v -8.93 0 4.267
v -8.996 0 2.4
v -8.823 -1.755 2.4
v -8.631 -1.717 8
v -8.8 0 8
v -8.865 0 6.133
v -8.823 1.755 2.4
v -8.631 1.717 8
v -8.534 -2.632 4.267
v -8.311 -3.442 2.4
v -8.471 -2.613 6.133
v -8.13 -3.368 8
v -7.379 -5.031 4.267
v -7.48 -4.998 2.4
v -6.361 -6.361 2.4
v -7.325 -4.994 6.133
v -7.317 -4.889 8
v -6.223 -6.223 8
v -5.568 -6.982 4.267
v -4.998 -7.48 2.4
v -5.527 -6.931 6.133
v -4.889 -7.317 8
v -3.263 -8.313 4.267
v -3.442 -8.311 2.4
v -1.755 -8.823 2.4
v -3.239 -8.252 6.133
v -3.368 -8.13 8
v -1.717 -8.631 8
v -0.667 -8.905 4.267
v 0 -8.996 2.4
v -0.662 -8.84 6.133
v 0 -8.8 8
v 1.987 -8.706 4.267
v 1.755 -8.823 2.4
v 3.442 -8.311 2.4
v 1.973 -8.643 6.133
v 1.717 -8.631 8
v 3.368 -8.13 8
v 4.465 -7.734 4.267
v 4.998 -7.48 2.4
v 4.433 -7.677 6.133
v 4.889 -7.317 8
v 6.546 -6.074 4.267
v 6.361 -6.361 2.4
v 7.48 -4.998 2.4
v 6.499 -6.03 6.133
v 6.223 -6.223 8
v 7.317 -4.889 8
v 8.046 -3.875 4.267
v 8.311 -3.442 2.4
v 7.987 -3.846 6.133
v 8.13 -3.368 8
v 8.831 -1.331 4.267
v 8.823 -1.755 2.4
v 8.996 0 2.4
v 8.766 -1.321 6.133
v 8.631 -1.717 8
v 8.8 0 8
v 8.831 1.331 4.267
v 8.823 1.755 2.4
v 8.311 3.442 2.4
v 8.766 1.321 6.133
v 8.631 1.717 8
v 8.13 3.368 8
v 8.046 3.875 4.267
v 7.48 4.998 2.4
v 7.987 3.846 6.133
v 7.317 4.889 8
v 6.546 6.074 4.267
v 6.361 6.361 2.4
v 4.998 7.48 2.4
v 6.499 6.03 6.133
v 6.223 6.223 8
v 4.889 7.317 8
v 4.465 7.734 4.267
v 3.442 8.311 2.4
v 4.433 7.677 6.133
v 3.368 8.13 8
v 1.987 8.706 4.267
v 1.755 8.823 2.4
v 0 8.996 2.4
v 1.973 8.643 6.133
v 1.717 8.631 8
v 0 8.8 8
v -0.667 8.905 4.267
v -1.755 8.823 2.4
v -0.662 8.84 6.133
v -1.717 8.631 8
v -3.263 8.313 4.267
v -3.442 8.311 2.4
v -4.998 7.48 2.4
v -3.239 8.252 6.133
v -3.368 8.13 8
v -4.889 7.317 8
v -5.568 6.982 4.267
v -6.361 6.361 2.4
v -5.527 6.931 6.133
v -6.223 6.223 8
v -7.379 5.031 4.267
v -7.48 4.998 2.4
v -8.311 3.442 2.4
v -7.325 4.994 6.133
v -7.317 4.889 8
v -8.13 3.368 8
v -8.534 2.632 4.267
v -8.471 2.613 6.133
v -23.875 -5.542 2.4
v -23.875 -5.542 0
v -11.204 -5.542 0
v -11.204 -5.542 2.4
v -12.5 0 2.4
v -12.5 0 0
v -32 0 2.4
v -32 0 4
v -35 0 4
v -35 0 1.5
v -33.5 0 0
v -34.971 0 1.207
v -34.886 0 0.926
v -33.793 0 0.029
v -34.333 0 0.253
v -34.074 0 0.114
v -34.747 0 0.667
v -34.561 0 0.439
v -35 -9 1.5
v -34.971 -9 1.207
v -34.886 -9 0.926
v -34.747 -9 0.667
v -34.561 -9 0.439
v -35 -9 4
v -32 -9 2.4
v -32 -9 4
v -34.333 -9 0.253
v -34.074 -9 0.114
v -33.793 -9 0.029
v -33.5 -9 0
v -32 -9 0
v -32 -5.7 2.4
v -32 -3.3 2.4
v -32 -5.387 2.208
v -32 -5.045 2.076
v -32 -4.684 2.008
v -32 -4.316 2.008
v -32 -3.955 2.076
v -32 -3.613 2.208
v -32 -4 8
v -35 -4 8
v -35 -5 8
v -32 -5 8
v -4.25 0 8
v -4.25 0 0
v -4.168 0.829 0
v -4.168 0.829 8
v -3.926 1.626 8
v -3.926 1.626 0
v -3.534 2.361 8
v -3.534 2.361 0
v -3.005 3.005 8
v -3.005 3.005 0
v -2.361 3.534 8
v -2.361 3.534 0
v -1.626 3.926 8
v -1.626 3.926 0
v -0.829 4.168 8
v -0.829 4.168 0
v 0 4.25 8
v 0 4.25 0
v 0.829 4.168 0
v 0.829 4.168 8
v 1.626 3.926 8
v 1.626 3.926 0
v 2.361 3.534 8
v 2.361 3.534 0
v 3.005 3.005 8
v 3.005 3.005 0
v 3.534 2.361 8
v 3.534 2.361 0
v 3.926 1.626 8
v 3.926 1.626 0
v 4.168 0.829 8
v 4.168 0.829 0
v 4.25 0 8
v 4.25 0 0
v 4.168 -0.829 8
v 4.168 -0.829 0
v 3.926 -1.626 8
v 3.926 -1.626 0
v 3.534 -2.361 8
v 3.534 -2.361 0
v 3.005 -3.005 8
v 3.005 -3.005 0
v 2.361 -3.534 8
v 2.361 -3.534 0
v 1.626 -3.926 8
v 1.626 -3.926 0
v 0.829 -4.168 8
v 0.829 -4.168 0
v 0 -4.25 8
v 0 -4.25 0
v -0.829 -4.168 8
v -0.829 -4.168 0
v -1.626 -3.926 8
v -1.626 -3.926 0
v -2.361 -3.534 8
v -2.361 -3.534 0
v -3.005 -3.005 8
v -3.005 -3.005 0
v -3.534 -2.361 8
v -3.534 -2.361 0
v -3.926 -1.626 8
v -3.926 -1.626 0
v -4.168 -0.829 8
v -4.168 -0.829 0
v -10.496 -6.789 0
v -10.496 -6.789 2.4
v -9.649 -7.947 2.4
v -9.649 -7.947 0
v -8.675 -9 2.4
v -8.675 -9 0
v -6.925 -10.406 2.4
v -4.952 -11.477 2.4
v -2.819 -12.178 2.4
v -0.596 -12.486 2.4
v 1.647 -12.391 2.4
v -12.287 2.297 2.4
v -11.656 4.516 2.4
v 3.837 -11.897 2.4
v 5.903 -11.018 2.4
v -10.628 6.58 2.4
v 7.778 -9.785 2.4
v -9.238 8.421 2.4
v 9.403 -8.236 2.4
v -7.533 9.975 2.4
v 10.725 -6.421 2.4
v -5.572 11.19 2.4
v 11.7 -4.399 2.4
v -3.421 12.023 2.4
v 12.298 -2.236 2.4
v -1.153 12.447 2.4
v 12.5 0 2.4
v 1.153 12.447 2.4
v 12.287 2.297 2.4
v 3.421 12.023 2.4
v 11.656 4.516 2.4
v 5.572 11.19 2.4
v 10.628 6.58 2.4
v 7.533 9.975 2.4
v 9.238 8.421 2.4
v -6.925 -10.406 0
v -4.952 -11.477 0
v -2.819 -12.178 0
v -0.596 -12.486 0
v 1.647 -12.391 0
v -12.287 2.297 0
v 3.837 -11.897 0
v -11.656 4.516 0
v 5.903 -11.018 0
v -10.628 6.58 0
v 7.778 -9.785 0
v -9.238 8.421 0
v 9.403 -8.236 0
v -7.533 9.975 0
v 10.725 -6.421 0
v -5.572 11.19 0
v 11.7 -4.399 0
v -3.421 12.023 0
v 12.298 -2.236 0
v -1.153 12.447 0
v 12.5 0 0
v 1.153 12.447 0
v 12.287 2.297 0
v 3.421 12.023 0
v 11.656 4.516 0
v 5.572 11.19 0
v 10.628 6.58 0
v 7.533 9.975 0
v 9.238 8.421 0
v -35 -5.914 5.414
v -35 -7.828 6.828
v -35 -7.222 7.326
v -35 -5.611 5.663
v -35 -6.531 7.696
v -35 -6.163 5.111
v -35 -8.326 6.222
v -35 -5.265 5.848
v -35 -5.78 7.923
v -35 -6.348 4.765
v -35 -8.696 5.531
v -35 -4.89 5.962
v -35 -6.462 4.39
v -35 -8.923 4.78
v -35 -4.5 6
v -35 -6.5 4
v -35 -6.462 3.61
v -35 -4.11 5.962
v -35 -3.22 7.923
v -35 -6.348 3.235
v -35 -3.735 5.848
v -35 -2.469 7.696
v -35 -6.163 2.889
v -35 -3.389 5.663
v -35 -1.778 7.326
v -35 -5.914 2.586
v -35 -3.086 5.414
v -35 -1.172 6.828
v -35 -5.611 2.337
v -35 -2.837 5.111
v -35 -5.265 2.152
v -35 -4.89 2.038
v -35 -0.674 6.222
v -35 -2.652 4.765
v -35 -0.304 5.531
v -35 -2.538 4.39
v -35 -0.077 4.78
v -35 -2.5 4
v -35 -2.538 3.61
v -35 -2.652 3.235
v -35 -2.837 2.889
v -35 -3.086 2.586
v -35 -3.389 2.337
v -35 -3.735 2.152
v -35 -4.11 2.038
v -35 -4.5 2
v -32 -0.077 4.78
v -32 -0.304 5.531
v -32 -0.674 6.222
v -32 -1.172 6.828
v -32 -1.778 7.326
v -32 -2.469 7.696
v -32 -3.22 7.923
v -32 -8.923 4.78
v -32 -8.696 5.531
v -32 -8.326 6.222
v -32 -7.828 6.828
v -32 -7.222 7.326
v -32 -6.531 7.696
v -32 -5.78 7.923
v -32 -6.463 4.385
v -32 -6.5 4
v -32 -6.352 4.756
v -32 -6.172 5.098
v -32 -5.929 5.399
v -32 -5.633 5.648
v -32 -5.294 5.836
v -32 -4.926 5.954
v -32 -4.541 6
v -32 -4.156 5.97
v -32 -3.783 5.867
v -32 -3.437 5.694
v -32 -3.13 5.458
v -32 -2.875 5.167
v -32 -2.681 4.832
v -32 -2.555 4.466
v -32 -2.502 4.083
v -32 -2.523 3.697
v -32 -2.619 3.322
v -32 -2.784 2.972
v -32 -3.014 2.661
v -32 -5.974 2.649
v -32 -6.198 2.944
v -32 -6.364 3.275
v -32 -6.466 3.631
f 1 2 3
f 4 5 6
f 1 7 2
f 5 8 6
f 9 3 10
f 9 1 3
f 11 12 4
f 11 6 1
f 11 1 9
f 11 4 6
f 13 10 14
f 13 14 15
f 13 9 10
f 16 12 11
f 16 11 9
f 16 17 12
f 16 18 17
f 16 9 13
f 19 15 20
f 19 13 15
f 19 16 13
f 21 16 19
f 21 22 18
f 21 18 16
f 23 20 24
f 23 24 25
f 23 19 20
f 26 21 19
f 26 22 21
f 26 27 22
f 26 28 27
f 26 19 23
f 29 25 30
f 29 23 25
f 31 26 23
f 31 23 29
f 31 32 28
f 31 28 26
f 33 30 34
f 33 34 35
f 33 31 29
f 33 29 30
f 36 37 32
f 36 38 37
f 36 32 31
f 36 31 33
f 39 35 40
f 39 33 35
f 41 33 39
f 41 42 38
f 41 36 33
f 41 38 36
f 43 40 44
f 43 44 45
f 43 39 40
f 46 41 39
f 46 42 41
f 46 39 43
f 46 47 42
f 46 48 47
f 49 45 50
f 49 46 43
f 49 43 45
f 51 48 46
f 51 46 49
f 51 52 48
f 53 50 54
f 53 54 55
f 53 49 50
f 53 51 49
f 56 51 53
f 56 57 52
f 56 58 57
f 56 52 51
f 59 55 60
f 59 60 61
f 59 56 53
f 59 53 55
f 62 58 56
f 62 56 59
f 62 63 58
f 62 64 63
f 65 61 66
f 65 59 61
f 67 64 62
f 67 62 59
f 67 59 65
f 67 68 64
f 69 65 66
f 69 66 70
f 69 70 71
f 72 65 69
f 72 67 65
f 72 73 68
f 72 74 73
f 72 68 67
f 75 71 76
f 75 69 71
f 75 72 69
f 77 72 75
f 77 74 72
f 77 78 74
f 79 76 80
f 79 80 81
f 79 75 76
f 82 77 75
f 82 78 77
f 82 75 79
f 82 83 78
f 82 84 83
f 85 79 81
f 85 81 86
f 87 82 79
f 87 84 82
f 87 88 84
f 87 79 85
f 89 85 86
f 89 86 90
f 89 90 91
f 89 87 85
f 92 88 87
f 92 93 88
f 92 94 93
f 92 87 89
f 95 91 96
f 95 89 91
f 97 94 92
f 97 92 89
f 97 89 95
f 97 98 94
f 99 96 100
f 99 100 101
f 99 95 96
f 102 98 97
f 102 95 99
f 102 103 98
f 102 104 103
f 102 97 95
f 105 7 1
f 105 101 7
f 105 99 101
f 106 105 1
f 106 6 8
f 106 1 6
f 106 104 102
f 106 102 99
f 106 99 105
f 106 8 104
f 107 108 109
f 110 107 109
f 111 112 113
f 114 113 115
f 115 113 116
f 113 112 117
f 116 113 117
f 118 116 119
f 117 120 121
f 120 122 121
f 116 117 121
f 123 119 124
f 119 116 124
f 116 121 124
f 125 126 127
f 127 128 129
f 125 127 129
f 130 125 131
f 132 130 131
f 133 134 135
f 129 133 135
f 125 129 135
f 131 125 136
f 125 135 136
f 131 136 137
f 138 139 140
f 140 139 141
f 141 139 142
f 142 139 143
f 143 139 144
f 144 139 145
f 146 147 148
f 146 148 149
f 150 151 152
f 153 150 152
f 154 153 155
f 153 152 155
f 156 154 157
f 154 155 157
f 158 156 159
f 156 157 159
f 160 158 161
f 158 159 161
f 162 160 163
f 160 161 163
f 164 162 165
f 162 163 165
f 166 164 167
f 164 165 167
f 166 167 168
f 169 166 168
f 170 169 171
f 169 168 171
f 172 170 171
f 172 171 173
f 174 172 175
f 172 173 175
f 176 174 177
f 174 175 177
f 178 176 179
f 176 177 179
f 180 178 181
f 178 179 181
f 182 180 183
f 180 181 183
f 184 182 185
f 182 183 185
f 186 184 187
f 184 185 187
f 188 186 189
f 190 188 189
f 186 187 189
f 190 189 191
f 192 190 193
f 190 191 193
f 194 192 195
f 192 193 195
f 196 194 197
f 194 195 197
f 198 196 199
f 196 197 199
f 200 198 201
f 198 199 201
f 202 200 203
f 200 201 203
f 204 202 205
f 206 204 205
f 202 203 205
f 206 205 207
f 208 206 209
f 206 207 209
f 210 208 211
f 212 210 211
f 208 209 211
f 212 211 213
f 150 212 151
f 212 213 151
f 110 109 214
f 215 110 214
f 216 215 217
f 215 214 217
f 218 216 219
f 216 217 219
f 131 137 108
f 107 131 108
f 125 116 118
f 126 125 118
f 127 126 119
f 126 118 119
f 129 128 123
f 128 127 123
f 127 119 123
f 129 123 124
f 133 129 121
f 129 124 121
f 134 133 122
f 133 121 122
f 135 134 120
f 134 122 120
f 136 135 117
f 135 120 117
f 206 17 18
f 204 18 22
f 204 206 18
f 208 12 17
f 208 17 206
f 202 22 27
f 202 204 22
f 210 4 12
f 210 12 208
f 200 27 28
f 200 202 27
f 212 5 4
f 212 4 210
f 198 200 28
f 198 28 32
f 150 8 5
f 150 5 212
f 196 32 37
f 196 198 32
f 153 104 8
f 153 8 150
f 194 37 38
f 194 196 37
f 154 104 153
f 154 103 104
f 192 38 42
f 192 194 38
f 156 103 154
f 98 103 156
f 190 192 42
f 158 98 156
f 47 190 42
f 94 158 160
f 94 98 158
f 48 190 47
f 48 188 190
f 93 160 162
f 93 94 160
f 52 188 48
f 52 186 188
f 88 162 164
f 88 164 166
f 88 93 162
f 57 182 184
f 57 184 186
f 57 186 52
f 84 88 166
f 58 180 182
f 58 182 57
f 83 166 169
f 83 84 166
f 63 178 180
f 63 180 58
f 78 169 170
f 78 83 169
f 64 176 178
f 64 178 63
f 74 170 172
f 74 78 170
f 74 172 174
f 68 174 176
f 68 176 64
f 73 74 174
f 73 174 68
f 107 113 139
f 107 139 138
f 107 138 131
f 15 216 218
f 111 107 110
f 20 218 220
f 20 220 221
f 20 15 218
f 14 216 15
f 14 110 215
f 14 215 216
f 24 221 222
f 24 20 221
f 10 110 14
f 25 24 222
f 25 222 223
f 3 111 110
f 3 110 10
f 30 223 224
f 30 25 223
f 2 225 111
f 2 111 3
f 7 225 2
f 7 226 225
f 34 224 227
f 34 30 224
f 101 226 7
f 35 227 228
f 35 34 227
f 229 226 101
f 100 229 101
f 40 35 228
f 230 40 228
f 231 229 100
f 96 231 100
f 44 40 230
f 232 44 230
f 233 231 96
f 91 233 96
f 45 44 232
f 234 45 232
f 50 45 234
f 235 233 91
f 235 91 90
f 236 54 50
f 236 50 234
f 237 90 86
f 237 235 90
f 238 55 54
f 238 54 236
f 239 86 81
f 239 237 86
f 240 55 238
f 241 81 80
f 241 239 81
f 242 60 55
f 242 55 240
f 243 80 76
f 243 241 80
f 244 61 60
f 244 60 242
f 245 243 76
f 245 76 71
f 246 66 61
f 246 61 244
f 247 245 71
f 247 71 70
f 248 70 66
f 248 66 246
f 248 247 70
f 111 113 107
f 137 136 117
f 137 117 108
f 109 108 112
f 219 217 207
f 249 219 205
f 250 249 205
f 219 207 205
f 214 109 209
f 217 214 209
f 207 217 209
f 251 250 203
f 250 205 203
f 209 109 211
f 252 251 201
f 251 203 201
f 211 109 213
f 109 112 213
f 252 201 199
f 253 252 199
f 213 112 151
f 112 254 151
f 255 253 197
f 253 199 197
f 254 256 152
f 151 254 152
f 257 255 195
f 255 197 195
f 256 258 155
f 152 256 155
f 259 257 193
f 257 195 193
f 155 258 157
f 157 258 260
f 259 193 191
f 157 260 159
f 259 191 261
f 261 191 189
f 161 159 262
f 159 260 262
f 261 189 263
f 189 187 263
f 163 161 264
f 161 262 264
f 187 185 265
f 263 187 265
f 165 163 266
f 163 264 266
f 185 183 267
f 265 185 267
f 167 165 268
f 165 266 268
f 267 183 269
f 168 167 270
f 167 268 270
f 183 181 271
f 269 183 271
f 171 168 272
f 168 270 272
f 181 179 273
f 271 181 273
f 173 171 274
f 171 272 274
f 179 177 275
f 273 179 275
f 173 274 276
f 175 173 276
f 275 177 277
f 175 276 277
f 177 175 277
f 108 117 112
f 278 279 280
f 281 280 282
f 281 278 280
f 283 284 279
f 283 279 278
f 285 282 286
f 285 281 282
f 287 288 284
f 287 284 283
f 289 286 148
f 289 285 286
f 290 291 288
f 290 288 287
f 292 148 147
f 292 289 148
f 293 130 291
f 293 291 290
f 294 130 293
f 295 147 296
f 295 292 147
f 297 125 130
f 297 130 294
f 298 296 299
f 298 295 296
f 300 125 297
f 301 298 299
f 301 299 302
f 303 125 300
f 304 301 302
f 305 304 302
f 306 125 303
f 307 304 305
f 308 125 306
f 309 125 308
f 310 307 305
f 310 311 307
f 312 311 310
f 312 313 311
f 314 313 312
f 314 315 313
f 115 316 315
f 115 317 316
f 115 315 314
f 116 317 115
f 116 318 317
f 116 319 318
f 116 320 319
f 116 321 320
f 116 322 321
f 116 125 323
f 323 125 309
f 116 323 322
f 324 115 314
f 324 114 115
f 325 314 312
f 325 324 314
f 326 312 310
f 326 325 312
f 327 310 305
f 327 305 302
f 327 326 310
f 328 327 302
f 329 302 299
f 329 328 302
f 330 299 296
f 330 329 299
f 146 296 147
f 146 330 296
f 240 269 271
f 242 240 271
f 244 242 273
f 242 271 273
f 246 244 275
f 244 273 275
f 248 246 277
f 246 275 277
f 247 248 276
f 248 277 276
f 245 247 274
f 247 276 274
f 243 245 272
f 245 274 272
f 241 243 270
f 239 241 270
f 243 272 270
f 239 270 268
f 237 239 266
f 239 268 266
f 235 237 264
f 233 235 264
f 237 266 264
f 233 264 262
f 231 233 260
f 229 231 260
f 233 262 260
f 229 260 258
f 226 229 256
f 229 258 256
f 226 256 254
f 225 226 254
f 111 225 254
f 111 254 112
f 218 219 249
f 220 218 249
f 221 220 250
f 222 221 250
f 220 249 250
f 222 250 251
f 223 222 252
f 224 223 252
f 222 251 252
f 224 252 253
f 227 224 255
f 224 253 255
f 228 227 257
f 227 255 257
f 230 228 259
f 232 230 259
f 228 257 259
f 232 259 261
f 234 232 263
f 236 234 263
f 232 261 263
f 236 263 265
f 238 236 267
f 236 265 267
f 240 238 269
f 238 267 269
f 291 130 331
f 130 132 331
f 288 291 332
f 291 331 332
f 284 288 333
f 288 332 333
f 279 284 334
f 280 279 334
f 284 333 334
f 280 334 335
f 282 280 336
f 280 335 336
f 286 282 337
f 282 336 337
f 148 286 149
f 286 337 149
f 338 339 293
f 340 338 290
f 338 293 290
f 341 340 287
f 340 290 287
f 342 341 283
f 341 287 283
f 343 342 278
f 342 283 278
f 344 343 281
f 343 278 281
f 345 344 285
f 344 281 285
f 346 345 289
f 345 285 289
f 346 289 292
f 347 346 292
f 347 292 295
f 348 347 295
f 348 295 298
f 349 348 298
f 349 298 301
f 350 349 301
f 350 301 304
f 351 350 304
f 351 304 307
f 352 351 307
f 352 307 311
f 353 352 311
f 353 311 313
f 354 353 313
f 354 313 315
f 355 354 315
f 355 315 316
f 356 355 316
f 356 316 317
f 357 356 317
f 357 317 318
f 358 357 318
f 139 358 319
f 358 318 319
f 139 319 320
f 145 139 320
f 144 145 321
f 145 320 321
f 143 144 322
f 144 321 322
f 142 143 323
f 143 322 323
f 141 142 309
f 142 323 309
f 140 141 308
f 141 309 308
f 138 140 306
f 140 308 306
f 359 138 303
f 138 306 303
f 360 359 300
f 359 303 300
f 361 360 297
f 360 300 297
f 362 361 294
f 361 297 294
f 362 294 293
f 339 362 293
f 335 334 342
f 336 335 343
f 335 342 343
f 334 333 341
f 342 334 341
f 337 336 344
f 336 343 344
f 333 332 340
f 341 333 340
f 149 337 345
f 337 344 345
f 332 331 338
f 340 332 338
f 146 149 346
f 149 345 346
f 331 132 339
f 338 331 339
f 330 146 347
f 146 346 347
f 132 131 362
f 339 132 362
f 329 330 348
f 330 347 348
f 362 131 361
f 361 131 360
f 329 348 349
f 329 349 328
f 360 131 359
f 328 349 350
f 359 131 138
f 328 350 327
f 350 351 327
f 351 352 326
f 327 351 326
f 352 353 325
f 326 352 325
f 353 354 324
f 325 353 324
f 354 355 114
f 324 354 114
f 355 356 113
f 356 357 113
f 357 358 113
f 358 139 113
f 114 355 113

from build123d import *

# Parameters (mm, degrees)
F1_DEPTH    = 2.4
F0_W        = 3
F0_H        = 9
F2_DEPTH    = 8
F4_R        = 2
F5_DEPTH    = 3
F6_R        = 4
F7_T1_DEPTH = 16.5


# Not quite as in the source:
# - a fillet or chamfer that OpenCascade refuses, or shapes differently, is made with other operations: its cross-section is extruded or revolved along the edge and cut away or added


with BuildPart() as f1:
    # F0 (on Top) → F1 (new body)
    with BuildSketch(Plane.XY):
        with BuildLine():
            ThreePointArc((-9, 0), (-8.5094701622, -2.9306855101), (-7.0913516535, -5.5419068674))
            Line((-7.0913516535, -5.5419068674), (-4.1106286956, -5.5419068674))
            ThreePointArc((-4.1106286956, -5.5419068674), (-6.1633326212, -3.1021494161), (-6.9, 0))
            Line((-6.9, 0), (-9, 0))
        make_face()
        with BuildLine():
            ThreePointArc((-7.0913516535, -5.5419068674), (-3.9447964582, -8.0894116537), (0, -9))
            ThreePointArc((0, -9), (6.3639610307, -6.3639610307), (9, 0))
            ThreePointArc((9, 0), (0, 9), (-9, 0))
            Line((-9, 0), (-6.9, 0))
            ThreePointArc((-6.9, 0), (0, 6.9), (6.9, 0))
            ThreePointArc((6.9, 0), (3.1021494161, -6.1633326212), (-4.1106286956, -5.5419068674))
            Line((-4.1106286956, -5.5419068674), (-7.0913516535, -5.5419068674))
        make_face()
        with BuildLine():
            Line((-23.8745937477, -5.5419068674), (-11.2043414922, -5.5419068674))
            ThreePointArc((-11.2043414922, -5.5419068674), (-12.1717761369, -2.8456749066), (-12.5, 0))
            Line((-12.5, 0), (-32, 0))
            Line((-32, 0), (-32, -9))
            Line((-32, -9), (-23.8745937477, -5.5419068674))
        make_face()
        with BuildLine():
            ThreePointArc((9, 0), (6.3639610307, -6.3639610307), (0, -9))
            Line((0, -9), (-8.6746757864, -9))
            ThreePointArc((-8.6746757864, -9), (4.8896090165, -11.5039872942), (12.5, 0))
            ThreePointArc((12.5, 0), (0, 12.5), (-12.5, 0))
            Line((-12.5, 0), (-9, 0))
            ThreePointArc((-9, 0), (0, 9), (9, 0))
        make_face()
        with BuildLine():
            Line((-11.2043414922, -5.5419068674), (-7.0913516535, -5.5419068674))
            ThreePointArc((-7.0913516535, -5.5419068674), (-8.5094701622, -2.9306855101), (-9, 0))
            Line((-9, 0), (-12.5, 0))
            ThreePointArc((-12.5, 0), (-12.1717761369, -2.8456749066), (-11.2043414922, -5.5419068674))
        make_face()
        with BuildLine():
            Line((-8.6746757864, -9), (0, -9))
            ThreePointArc((0, -9), (-3.9447964582, -8.0894116537), (-7.0913516535, -5.5419068674))
            Line((-7.0913516535, -5.5419068674), (-11.2043414922, -5.5419068674))
            ThreePointArc((-11.2043414922, -5.5419068674), (-10.0887776276, -7.3801467452), (-8.6746757864, -9))
        make_face()
    extrude(amount=F1_DEPTH)

    # F0 (on Top) → F2 (join)
    with BuildSketch(Plane.XY):
        with BuildLine():
            ThreePointArc((-6.9, 0), (-6.1633326212, -3.1021494161), (-4.1106286956, -5.5419068674))
            ThreePointArc((-4.1106286956, -5.5419068674), (3.1021494161, -6.1633326212), (6.9, 0))
            ThreePointArc((6.9, 0), (0, 6.9), (-6.9, 0))
        make_face()
        with BuildLine():
            ThreePointArc((4.25, 0), (0, -4.25), (-4.25, 0))
            ThreePointArc((-4.25, 0), (0, 4.25), (4.25, 0))
        make_face(mode=Mode.SUBTRACT)
        with Locations((-33.5, -4.5)):
            Rectangle(F0_W, F0_H)
        with BuildLine():
            ThreePointArc((-7.0913516535, -5.5419068674), (-3.9447964582, -8.0894116537), (0, -9))
            ThreePointArc((0, -9), (6.3639610307, -6.3639610307), (9, 0))
            ThreePointArc((9, 0), (0, 9), (-9, 0))
            Line((-9, 0), (-6.9, 0))
            ThreePointArc((-6.9, 0), (0, 6.9), (6.9, 0))
            ThreePointArc((6.9, 0), (3.1021494161, -6.1633326212), (-4.1106286956, -5.5419068674))
            Line((-4.1106286956, -5.5419068674), (-7.0913516535, -5.5419068674))
        make_face()
        with BuildLine():
            ThreePointArc((-9, 0), (-8.5094701622, -2.9306855101), (-7.0913516535, -5.5419068674))
            Line((-7.0913516535, -5.5419068674), (-4.1106286956, -5.5419068674))
            ThreePointArc((-4.1106286956, -5.5419068674), (-6.1633326212, -3.1021494161), (-6.9, 0))
            Line((-6.9, 0), (-9, 0))
        make_face()
    extrude(amount=F2_DEPTH)

    # F4 (on offset) → F5 (cut, through all)
    with BuildSketch(Plane(origin=(-35, 0, 0), x_dir=(0, -1, 0), z_dir=(-1, 0, 0))):
        with Locations((4.5, 4)):
            Circle(F4_R)
    extrude(amount=-F5_DEPTH, mode=Mode.SUBTRACT)

    # F6
    f6_edges = [f1.edges().sort_by_distance(p)[0] for p in [
        (-33.5, -9, 8),
        (-33.5, 0, 8),
    ]]
    fillet(f6_edges, radius=F6_R)

    # F7: fillet of radius 1.5 on 2 edges, made by hand

    # F7_s2 → F7_t1 (cut)
    with BuildSketch(Plane.XZ.offset(-3.75)):
        with BuildLine():
            ThreePointArc((-35, 1.5), (-34.5606601718, 0.4393398282), (-33.5, 0))
            Line((-33.5, 0), (-35, 0))
            Line((-35, 0), (-35, 1.5))
        make_face()
    extrude(amount=F7_T1_DEPTH, mode=Mode.SUBTRACT)

    # F8: chamfer of 0.2 x 5.7272506566 on 1 edges, made by hand


with BuildPart() as f8_tool2:
    # F8_s3 → F8_t4 (revolve)
    with BuildSketch(Plane.XZ):
        Polygon((-9, 2.2727493434), (-8.8, 8), (-9, 8), align=None)
    revolve(axis=Axis((0, 0, 8), (0, 0, 1)))

    split(bisect_by=Plane.XY.offset(2.4), keep=Keep.TOP)


with BuildPart() as f1_1:
    add(f1.part)

    # F8_t1: cut F8_tool2
    add(f8_tool2.part, mode=Mode.SUBTRACT)


solid = f1_1.part
